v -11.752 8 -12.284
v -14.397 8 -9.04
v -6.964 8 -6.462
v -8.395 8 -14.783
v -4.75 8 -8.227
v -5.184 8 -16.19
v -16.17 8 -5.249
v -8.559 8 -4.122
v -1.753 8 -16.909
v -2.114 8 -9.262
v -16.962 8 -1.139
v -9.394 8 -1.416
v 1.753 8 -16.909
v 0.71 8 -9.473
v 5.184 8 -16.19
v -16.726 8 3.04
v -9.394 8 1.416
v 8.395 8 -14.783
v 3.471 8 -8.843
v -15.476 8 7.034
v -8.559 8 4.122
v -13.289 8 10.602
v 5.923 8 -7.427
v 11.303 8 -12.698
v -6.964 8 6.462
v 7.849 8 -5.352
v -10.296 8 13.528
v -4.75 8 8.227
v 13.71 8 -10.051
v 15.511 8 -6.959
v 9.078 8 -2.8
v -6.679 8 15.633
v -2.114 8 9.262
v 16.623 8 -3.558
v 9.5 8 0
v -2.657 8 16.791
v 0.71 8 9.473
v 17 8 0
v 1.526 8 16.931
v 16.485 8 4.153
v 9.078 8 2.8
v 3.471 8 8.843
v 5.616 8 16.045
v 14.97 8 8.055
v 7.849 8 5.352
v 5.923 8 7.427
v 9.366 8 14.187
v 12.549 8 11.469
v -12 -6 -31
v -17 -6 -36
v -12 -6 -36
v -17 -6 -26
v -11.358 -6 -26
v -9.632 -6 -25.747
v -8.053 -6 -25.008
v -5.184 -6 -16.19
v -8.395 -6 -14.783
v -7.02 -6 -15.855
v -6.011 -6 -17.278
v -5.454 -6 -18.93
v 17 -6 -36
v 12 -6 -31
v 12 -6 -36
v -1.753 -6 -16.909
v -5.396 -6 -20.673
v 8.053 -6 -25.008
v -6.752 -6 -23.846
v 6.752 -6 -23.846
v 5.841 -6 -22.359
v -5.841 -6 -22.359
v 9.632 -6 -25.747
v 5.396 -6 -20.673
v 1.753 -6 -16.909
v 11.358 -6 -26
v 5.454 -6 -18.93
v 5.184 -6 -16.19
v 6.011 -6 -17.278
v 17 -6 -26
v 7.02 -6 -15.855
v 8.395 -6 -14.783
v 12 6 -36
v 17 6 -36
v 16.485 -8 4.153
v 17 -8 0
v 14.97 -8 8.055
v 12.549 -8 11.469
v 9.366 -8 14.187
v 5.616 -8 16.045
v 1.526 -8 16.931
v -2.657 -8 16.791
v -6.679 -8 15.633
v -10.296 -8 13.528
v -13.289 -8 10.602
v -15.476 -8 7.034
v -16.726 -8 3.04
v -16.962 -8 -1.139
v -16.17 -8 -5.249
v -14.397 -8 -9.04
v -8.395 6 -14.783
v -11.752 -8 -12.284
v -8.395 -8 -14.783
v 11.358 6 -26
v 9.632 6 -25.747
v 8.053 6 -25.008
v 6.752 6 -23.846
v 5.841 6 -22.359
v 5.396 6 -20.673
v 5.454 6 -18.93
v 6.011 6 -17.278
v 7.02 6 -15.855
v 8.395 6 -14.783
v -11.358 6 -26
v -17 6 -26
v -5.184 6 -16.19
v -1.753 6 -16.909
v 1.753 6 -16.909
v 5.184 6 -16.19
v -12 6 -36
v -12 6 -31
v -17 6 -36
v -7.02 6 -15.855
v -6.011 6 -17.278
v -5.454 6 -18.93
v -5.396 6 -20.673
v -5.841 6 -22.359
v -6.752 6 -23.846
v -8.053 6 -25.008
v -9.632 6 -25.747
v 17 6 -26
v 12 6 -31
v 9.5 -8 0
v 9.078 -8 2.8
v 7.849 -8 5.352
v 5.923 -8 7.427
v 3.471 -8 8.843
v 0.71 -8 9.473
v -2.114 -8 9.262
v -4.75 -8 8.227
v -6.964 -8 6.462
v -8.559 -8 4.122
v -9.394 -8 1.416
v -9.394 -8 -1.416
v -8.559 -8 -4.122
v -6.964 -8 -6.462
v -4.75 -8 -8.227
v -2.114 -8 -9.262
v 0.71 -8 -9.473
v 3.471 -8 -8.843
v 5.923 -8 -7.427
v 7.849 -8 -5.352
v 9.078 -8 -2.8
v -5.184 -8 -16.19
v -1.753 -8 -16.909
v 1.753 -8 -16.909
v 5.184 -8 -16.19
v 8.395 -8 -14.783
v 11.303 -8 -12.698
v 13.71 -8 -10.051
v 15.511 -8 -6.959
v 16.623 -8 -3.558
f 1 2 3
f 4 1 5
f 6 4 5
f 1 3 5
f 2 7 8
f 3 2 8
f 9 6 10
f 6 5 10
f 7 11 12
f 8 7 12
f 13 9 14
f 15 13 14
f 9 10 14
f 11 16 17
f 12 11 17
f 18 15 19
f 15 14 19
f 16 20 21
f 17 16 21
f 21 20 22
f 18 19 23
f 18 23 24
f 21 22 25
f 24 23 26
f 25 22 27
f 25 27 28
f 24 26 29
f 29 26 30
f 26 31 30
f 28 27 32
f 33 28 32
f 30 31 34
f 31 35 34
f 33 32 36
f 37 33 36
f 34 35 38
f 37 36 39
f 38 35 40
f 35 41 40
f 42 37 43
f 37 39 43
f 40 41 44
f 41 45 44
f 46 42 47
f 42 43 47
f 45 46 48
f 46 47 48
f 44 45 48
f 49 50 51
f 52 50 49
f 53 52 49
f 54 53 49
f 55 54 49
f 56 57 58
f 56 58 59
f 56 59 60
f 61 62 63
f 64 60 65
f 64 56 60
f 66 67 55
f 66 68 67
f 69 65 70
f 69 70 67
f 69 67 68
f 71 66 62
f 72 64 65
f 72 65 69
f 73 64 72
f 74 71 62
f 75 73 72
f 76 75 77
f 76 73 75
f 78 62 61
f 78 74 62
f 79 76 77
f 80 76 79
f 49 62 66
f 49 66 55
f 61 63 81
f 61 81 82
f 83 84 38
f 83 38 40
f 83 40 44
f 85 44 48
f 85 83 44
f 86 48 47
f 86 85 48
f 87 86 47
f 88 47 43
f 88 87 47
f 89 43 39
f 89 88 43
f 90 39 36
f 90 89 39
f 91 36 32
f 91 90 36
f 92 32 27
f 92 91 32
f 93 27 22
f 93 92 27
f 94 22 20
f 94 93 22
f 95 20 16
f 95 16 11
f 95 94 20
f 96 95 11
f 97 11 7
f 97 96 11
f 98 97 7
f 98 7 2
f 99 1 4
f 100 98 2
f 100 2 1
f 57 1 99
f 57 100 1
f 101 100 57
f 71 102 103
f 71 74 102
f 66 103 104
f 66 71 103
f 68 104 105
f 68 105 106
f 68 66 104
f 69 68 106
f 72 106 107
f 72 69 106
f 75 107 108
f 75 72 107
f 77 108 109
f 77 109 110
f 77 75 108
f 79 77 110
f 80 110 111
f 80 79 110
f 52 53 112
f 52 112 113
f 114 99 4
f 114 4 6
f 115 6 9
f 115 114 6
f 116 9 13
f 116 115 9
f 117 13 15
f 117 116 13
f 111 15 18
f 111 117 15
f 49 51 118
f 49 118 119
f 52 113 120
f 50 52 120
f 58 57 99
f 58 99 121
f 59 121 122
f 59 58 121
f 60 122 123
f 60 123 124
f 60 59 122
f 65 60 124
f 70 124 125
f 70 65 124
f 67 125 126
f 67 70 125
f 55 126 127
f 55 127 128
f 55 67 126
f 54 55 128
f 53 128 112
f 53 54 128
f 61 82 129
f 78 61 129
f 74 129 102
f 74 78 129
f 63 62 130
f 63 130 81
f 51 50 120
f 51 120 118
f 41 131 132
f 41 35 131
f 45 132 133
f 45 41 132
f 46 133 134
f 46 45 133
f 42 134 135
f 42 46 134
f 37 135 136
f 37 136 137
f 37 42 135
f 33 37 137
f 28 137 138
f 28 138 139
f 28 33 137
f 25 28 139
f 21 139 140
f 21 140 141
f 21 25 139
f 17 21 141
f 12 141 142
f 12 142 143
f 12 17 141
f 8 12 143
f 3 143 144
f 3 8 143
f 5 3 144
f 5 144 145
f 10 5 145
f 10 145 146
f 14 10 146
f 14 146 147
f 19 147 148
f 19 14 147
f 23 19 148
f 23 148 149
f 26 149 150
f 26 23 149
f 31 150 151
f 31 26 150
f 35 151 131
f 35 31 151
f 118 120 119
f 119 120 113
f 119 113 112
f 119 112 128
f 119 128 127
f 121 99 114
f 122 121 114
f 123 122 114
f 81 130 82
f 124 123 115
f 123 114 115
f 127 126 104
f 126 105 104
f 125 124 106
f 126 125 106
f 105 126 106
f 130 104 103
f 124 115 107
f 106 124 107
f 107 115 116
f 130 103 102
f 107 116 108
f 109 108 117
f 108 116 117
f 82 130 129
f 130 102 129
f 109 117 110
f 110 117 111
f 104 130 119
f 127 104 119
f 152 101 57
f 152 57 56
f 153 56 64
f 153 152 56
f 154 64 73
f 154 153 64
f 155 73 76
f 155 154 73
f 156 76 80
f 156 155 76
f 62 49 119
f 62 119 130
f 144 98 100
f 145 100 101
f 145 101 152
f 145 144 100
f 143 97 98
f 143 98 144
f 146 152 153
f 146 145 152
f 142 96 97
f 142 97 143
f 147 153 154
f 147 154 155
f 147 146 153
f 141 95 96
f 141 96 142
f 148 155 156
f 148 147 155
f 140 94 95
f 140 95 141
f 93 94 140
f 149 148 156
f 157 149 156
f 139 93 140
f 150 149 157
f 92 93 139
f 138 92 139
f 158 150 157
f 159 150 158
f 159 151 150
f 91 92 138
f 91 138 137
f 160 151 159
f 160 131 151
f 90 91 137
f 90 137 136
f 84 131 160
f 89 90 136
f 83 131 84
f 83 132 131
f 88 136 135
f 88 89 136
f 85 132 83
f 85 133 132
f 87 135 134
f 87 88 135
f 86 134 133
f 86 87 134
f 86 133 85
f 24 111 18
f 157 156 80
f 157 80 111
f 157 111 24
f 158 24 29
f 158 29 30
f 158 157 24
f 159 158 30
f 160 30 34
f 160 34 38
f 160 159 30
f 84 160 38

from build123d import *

# Parameters (mm, degrees)
F1_DEPTH = 6
F0_R     = 9.5
F2_DEPTH = 8


with BuildPart() as f1:
    # F0 (on Front) → F1 (new body, symmetric)
    with BuildSketch(Plane.XZ):
        with BuildLine():
            ThreePointArc((8.394908, -14.782609), (0, -17), (-8.394908, -14.782609))
            ThreePointArc((-8.394908, -14.782609), (-5.556767, -21.532262), (-11.357817, -26))
            Line((-11.357817, -26), (-17, -26))
            Line((-17, -26), (-17, -36))
            Line((-17, -36), (-12, -36))
            Line((-12, -36), (-12, -31))
            Line((-12, -31), (12, -31))
            Line((12, -31), (12, -36))
            Line((12, -36), (17, -36))
            Line((17, -36), (17, -26))
            Line((17, -26), (11.357817, -26))
            ThreePointArc((11.357817, -26), (5.556767, -21.532262), (8.394908, -14.782609))
        make_face()
    extrude(amount=F1_DEPTH, both=True)

    # F0 (on Front) → F2 (join, symmetric)
    with BuildSketch(Plane.XZ):
        with BuildLine():
            ThreePointArc((8.394908, -14.782609), (14.692063, -8.552385), (17, 0))
            ThreePointArc((17, 0), (-8.552385, 14.692063), (-8.394908, -14.782609))
            ThreePointArc((-8.394908, -14.782609), (0, -17), (8.394908, -14.782609))
        make_face()
        Circle(F0_R, mode=Mode.SUBTRACT)
    extrude(amount=F2_DEPTH, both=True)


solid = f1.part
